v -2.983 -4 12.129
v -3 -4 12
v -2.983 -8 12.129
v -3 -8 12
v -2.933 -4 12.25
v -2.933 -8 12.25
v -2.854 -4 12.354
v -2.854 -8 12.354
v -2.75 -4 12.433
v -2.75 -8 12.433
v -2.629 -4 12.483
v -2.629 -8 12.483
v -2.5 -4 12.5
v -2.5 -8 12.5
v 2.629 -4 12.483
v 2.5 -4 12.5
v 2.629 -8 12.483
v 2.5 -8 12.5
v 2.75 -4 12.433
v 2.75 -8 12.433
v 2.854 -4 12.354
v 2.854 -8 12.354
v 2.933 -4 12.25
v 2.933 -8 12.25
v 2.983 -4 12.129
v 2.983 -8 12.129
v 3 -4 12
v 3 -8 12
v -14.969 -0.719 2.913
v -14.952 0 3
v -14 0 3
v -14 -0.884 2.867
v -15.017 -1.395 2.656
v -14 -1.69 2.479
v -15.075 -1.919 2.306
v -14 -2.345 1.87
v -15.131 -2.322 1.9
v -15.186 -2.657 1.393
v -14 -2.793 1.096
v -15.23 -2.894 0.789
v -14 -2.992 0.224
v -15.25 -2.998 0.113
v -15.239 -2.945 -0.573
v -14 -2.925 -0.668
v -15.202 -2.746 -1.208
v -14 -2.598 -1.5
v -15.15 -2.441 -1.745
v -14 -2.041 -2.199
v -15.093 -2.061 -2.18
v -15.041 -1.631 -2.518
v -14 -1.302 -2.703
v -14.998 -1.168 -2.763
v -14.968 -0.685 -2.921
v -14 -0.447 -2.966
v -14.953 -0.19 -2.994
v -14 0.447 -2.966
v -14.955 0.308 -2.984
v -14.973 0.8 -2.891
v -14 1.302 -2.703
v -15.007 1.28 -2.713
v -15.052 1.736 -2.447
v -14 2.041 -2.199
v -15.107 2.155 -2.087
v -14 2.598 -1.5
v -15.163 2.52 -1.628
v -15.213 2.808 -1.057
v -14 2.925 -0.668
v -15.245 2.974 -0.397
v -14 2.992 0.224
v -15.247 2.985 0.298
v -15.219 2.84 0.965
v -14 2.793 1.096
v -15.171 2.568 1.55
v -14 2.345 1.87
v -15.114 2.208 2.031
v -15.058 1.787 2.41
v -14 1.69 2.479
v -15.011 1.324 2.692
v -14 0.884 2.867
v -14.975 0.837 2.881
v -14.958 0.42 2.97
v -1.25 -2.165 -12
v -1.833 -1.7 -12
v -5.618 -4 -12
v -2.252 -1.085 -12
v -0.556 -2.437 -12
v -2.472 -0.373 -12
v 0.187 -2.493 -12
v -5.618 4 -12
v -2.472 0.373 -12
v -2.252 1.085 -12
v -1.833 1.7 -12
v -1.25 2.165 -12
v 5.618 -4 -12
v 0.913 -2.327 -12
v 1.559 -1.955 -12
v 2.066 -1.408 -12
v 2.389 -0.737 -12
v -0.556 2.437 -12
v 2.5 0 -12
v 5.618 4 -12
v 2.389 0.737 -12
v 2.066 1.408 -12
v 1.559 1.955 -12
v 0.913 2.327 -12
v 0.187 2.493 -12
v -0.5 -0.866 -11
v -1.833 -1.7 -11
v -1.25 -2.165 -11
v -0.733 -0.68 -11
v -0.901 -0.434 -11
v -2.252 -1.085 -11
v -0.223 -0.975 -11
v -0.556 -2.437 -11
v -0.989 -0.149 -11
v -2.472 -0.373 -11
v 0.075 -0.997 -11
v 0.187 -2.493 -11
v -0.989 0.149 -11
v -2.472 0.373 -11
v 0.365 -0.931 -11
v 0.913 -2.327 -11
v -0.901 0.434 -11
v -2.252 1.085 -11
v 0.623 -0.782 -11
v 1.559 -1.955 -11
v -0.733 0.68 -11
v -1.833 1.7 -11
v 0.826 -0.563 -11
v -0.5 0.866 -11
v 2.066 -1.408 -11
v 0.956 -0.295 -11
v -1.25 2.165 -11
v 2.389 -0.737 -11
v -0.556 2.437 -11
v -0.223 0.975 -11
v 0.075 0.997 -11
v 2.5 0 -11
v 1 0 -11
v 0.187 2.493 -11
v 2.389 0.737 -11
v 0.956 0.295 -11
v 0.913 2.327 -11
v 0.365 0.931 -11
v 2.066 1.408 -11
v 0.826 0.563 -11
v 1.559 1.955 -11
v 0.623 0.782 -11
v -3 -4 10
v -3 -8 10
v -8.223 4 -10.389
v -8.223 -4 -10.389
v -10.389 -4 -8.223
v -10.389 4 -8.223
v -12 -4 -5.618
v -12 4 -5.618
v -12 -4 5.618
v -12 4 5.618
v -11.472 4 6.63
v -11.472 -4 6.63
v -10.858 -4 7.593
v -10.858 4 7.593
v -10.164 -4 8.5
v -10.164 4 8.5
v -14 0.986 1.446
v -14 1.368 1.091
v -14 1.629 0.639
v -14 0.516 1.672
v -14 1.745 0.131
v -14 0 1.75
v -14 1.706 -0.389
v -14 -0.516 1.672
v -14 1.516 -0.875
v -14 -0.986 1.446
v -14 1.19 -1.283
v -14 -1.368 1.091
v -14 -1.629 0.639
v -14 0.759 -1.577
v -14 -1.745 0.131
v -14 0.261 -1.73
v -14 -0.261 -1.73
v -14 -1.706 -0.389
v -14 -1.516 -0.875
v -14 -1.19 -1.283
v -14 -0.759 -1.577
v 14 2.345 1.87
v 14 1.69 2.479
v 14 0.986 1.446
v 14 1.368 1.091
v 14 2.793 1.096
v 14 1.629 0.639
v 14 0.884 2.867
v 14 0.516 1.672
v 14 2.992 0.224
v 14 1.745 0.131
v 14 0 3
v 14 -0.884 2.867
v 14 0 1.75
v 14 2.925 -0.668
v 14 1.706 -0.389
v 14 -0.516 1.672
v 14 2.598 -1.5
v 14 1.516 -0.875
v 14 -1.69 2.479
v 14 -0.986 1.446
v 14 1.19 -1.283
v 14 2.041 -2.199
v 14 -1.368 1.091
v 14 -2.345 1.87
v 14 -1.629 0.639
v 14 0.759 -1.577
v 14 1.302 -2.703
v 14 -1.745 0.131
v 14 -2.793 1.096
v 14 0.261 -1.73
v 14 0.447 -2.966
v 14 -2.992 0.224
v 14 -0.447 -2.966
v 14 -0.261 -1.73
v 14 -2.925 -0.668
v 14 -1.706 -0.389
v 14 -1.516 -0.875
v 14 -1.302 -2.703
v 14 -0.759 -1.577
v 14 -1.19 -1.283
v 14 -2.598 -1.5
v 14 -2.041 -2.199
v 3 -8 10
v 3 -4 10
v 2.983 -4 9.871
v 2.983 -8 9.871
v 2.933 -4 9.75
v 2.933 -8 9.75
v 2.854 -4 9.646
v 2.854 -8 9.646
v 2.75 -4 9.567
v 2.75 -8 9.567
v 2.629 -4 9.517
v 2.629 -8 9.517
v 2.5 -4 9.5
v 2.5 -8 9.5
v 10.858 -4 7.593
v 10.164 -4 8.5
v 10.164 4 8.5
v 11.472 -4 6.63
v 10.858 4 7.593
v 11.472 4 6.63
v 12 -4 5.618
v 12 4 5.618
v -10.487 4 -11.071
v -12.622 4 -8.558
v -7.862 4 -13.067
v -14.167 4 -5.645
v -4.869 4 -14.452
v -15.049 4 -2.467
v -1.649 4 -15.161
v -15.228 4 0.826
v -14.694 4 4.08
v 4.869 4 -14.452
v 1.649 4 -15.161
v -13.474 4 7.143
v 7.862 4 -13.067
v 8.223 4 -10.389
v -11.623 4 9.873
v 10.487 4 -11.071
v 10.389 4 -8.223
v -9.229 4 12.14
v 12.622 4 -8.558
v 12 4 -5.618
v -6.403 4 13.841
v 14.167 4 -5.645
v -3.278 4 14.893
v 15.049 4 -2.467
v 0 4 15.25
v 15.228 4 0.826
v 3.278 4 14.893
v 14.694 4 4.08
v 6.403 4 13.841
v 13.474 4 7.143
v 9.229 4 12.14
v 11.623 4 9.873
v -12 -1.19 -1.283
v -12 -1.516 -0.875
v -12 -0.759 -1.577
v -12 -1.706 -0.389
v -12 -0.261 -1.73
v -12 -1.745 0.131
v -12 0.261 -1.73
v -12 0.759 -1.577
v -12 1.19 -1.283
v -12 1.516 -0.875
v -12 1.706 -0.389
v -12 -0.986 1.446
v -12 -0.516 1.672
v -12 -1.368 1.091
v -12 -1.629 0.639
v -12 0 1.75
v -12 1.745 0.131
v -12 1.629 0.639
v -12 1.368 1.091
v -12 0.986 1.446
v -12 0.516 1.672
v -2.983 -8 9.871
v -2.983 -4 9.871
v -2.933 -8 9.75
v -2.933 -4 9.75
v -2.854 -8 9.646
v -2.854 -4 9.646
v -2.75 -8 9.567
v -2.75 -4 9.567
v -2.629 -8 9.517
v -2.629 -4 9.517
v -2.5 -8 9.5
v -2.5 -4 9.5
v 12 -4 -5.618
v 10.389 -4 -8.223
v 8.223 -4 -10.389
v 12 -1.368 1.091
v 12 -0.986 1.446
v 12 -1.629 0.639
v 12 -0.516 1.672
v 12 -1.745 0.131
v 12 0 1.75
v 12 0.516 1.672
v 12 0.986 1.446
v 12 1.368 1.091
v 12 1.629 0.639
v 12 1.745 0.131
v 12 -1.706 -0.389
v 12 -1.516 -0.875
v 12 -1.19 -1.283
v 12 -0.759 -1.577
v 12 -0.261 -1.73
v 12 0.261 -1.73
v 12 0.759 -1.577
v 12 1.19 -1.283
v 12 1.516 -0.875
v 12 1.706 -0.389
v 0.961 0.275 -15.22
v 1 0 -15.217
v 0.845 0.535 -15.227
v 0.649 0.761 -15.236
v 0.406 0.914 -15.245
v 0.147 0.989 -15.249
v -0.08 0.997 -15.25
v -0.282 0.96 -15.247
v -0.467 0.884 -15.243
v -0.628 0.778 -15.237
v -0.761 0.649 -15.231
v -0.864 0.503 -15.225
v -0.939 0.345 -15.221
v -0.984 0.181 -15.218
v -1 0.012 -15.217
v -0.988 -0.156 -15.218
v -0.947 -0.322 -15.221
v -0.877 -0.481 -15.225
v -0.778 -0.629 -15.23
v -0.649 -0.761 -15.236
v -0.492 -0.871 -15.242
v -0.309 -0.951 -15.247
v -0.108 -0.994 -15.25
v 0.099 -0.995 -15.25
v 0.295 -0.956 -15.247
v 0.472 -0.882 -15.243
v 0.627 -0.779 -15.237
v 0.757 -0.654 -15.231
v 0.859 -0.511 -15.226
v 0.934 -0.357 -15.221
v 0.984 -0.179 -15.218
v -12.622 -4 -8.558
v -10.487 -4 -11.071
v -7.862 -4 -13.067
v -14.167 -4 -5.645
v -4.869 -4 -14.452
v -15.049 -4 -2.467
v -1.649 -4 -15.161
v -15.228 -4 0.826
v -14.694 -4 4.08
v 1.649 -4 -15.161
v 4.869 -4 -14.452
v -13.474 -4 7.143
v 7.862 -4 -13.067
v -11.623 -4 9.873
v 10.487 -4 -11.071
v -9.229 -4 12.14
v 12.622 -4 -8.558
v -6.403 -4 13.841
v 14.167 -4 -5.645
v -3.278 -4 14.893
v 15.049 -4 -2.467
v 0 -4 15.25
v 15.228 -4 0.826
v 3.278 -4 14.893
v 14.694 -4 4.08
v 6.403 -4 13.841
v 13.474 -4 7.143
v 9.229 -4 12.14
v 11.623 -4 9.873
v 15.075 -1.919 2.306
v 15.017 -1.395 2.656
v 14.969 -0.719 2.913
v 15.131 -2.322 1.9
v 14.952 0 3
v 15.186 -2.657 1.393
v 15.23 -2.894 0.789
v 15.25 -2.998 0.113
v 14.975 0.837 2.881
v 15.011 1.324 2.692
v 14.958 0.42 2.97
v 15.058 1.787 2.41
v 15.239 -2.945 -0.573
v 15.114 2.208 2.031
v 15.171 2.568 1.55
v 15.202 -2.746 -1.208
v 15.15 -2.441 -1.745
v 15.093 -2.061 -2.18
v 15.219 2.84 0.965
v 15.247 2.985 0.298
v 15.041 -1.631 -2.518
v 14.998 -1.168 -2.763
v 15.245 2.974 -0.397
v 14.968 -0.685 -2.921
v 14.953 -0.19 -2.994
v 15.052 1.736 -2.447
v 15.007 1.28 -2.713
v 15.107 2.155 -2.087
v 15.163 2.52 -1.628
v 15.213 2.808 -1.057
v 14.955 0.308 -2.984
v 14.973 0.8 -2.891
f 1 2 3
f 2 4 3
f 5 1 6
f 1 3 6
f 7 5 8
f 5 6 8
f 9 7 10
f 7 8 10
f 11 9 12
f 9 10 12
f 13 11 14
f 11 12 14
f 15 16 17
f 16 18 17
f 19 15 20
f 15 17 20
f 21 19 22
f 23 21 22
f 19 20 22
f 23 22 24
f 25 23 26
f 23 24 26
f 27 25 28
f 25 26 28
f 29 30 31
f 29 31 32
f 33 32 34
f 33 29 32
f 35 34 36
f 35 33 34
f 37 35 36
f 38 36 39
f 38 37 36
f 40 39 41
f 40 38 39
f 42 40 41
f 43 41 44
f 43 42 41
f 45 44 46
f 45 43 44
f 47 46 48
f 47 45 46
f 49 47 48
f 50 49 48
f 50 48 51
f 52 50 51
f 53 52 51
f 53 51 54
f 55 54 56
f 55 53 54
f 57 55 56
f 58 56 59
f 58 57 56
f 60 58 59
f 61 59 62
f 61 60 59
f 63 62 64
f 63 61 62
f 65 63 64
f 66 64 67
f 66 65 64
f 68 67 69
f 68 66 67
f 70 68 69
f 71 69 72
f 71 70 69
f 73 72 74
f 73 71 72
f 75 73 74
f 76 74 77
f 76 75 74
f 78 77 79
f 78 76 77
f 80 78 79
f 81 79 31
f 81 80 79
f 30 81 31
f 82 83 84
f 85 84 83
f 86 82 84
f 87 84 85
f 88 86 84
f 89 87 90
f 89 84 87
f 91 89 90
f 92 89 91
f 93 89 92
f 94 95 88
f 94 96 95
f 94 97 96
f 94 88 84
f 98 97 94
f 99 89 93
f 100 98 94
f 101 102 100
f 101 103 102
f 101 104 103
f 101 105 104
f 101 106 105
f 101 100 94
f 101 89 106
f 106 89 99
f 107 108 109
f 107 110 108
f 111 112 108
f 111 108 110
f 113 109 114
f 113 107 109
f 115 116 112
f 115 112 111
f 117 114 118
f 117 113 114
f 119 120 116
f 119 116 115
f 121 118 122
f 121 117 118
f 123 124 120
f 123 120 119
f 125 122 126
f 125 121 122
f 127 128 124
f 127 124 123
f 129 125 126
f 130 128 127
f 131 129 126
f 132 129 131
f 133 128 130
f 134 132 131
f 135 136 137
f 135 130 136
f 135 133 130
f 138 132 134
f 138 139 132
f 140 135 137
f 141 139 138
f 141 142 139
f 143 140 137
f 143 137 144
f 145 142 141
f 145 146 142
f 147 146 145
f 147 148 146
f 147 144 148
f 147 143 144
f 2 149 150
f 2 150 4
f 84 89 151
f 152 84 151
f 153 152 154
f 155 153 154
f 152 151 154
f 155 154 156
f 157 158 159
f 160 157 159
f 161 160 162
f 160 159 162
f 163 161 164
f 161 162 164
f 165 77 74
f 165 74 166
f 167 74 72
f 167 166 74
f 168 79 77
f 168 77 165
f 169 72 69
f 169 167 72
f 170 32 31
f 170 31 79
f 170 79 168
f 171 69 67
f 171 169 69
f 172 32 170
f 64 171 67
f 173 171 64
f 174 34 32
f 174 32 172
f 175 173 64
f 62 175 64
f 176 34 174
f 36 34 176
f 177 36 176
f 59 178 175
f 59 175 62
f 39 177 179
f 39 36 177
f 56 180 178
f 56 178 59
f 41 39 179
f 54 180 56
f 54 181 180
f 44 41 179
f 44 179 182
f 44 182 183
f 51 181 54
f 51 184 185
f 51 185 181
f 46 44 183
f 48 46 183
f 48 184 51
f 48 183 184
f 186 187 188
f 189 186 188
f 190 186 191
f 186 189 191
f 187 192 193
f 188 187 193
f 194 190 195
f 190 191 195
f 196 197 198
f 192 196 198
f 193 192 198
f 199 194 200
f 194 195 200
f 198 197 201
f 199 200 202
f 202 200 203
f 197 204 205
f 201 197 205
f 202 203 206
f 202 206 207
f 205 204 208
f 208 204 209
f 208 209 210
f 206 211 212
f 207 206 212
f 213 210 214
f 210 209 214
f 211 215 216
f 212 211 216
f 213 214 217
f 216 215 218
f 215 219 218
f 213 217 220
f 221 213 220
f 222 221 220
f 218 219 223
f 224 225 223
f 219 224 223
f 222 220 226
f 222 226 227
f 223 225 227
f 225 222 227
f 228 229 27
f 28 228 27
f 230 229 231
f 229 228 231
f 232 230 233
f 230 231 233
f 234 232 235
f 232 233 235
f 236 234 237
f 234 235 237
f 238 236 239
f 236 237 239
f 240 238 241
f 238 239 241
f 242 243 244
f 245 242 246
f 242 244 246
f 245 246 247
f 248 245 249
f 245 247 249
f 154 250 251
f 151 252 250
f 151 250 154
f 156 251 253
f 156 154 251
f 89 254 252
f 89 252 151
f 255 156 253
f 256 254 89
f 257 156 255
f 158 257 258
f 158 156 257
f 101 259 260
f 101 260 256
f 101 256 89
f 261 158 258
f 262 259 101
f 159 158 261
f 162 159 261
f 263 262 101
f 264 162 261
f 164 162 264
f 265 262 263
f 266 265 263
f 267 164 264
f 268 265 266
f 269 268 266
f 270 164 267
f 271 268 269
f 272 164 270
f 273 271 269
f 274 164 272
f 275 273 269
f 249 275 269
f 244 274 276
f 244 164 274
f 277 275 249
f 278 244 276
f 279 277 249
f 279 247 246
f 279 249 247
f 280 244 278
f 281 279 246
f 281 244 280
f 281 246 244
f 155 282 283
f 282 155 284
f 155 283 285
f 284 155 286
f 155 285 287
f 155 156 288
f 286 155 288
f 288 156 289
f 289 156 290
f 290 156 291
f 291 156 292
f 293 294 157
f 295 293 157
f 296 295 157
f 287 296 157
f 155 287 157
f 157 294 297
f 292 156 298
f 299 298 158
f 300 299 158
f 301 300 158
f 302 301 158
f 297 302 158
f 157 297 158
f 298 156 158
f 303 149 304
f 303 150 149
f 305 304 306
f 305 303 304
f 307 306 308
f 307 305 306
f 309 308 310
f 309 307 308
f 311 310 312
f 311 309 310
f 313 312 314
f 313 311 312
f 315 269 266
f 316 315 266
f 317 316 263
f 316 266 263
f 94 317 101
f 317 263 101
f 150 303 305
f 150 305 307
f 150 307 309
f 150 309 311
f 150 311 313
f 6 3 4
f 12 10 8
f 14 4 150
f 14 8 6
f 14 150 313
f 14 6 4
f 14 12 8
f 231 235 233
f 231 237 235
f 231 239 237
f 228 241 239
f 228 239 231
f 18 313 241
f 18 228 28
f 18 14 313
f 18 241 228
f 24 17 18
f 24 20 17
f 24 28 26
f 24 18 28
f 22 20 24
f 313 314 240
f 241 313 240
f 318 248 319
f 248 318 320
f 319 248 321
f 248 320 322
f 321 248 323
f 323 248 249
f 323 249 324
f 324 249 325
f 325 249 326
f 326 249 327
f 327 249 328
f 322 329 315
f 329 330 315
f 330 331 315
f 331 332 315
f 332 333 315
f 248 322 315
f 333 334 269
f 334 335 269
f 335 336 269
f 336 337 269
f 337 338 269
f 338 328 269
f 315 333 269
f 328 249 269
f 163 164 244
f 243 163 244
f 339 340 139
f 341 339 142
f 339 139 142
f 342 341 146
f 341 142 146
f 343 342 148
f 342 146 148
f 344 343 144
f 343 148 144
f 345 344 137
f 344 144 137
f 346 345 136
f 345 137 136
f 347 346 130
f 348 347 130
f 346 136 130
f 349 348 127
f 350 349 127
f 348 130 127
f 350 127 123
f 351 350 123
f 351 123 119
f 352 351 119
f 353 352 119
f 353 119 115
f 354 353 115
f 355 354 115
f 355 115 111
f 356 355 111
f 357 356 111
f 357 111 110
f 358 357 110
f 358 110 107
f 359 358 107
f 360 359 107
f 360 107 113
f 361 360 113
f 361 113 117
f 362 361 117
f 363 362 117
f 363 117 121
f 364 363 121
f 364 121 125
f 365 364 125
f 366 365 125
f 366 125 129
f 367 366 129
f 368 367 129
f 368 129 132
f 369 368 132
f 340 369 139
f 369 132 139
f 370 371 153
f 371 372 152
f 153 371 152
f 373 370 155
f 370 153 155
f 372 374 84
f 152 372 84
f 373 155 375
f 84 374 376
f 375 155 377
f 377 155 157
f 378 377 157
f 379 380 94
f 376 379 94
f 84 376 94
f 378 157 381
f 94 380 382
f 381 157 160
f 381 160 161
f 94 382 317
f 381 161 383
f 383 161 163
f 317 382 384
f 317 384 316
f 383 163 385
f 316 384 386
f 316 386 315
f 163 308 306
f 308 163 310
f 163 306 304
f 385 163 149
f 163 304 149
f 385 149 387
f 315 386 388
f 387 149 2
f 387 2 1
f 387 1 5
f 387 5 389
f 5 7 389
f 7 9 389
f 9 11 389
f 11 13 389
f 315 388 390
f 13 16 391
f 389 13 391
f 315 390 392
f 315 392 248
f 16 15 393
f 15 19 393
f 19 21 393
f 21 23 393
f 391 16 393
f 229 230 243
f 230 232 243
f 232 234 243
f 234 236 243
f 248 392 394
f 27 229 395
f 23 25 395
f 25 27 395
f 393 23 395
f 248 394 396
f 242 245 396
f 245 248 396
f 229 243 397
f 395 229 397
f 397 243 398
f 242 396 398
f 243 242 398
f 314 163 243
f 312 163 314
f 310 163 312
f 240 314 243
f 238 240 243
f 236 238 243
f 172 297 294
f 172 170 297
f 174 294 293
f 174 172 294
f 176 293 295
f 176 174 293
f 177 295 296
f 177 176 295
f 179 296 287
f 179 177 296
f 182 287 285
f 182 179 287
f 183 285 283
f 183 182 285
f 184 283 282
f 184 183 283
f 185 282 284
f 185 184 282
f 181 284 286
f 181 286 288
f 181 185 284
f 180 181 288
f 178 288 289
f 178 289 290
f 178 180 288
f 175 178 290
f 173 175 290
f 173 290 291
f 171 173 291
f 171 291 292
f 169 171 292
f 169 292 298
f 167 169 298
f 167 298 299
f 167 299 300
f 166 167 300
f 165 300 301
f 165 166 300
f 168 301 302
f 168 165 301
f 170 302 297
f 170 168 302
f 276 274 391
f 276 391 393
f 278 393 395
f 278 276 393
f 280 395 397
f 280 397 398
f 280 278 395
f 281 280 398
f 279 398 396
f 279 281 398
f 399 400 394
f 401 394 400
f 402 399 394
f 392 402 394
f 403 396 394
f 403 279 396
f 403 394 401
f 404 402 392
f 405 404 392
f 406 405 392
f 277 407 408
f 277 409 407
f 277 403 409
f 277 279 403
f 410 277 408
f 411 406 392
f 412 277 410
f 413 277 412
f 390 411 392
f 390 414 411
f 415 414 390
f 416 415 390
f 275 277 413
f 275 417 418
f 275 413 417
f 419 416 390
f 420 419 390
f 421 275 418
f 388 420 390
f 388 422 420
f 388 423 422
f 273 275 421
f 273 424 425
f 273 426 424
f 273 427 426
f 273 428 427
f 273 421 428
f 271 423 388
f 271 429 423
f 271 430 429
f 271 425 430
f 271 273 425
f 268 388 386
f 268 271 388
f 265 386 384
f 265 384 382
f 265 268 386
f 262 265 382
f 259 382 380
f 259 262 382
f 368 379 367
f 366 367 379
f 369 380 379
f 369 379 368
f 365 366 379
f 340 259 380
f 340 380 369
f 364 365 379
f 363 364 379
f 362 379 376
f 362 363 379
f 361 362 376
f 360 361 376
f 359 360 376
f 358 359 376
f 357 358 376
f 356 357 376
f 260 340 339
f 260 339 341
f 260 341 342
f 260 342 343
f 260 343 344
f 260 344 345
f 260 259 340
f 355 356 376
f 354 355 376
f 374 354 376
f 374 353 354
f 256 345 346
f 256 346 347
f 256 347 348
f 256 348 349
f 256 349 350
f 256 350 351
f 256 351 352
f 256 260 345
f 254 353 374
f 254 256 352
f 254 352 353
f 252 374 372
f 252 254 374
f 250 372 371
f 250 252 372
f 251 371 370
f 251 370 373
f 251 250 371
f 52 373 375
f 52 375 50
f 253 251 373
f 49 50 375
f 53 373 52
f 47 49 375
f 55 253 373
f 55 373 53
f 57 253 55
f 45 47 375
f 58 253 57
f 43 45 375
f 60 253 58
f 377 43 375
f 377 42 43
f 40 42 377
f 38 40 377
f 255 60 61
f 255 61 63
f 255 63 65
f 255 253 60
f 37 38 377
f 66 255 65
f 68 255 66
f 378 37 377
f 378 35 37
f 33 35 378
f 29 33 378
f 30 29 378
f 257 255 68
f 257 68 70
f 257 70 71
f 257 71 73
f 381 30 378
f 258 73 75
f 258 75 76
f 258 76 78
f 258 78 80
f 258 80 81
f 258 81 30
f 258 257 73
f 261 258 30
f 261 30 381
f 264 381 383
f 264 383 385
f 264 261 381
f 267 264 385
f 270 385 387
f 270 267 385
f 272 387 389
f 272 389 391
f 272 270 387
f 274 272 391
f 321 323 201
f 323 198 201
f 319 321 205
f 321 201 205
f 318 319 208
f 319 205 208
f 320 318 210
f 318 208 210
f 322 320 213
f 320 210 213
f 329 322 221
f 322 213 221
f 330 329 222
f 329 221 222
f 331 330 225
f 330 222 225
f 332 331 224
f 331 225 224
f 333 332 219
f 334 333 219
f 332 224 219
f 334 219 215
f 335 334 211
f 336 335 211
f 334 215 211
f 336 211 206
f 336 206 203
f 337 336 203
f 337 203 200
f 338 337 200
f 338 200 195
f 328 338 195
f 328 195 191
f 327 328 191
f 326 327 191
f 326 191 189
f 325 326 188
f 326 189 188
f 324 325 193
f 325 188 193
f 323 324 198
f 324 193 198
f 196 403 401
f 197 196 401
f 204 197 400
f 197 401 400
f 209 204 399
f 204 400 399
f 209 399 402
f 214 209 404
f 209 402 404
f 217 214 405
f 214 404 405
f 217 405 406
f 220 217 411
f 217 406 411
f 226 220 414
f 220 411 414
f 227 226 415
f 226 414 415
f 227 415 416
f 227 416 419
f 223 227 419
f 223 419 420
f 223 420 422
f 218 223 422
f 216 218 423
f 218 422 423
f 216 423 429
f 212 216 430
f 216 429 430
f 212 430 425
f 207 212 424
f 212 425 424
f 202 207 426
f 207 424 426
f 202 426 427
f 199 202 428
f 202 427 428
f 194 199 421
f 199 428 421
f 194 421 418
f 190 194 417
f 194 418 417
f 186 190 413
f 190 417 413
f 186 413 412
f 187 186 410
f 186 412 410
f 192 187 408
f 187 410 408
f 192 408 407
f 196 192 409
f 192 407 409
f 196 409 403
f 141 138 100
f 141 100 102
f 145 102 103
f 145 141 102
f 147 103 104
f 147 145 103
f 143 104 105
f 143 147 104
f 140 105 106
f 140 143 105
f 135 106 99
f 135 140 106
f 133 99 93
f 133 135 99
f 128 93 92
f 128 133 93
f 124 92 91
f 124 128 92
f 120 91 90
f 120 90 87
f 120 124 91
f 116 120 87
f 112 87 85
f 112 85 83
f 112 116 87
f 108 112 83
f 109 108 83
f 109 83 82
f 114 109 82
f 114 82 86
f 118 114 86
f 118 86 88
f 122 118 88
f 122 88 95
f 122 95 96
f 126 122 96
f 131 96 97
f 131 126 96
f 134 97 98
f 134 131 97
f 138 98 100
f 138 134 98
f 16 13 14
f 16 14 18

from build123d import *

# Parameters (mm, degrees)
SKETCH_1_R          = 15.25
EXTRUDE_1_DEPTH     = 4
CUT_EXTRUDE_1_DEPTH = 24.002717231
EXTRUDE_3_REACH     = 33.482
SKETCH_17_W         = 11.236102528
SKETCH_17_H         = 8
SKETCH_16_R         = 1
CUT_EXTRUDE_7_DEPTH = 22.93456194
EXTRUDE_START       = 1
SKETCH_18_R         = 2.5
SKETCH_18_R_2       = 1
EXTRUDE_4_DEPTH     = 1
SKETCH_19_W         = 6
SKETCH_19_H         = 3
EXTRUDE_5_DEPTH     = 4
FILLET_1_R          = 0.5


with BuildPart() as part:
    # 草图1 → 凸台-拉伸1 (new, symmetric)
    with BuildSketch(Plane(origin=(0, 0, 0), x_dir=(1, 0, 0), z_dir=(0, 1, 0))):
        with Locations(Location((0, 0, 0), (0, 0, 270))):
            Circle(SKETCH_1_R)
    extrude(amount=EXTRUDE_1_DEPTH, both=True)

    # 草图2 → 切除-拉伸1 (cut, through all)
    with BuildSketch(Plane(origin=(0, 4, 0), x_dir=(1, 0, 0), z_dir=(0, 1, 0))):
        with BuildLine():
            Line((-12, 5.618051264), (-12, -5.618051264))
            ThreePointArc((-12, -5.618051264), (-11.175427785, -7.118448835), (-10.164275675, -8.5))
            Line((-10.164275675, -8.5), (10.164275675, -8.5))
            ThreePointArc((10.164275675, -8.5), (11.175427785, -7.118448835), (12, -5.618051264))
            Line((12, -5.618051264), (12, 5.618051264))
            ThreePointArc((12, 5.618051264), (0, 13.25), (-12, 5.618051264))
        make_face()
    extrude(amount=-CUT_EXTRUDE_1_DEPTH, mode=Mode.SUBTRACT)

    # 草图3 → 切除-旋转4 (revolve, cut)
    with BuildSketch(Plane(origin=(0, 0, 0), x_dir=(1, 0, 0), z_dir=(0, 1, 0)), mode=Mode.PRIVATE) as cut_revolve_4_sk:
        Polygon((12, 0), (12, 1.75), (14, 1.75), (14, 3), (20, 3), (20, 0), align=None)
    cut_revolve_4 = revolve(cut_revolve_4_sk.sketch.rotate(Axis((0, 0, 0), (1, 0, 0)), 180), axis=Axis((0, 0, 0), (1, 0, 0)), mode=Mode.SUBTRACT)

    # 镜向1: 切除-旋转4 across plane
    add(cut_revolve_4.mirror(Plane(origin=(0, 0, 0), x_dir=(0, 0, 1), z_dir=(1, 0, 0))), mode=Mode.SUBTRACT)

    # 草图17 → 凸台-拉伸3 (add, up to next)
    with BuildSketch(Plane.XY.offset(-12), mode=Mode.PRIVATE) as extrude_3_sk1:
        Rectangle(SKETCH_17_W, SKETCH_17_H)
    extrude_3_tool1 = extrude(extrude_3_sk1.sketch, amount=-EXTRUDE_3_REACH, mode=Mode.PRIVATE) - part.part
    add(extrude_3_tool1.solids().sort_by_distance((0, 0, -12))[0])

    # 草图16 → 切除-拉伸7 (cut, through all)
    with BuildSketch(Plane.XY):
        Circle(SKETCH_16_R)
    extrude(amount=-CUT_EXTRUDE_7_DEPTH, mode=Mode.SUBTRACT)

    # 草图18 → 凸台-拉伸4 (add)
    with BuildSketch(Plane.XY.offset(-12).offset(EXTRUDE_START)):
        Circle(SKETCH_18_R)
        Circle(SKETCH_18_R_2, mode=Mode.SUBTRACT)
    extrude(amount=-EXTRUDE_4_DEPTH)

    # 草图19 → 凸台-拉伸5 (add)
    with BuildSketch(Plane.XZ.offset(4)):
        with Locations((0, 11)):
            Rectangle(SKETCH_19_W, SKETCH_19_H)
    extrude(amount=EXTRUDE_5_DEPTH)

    # 圆角1
    fillet_1_edges = [part.edges().sort_by_distance(p)[0] for p in [
        (3, -6, 9.5),
        (3, -6, 12.5),
        (-3, -6, 12.5),
        (-3, -6, 9.5),
    ]]
    fillet(fillet_1_edges, radius=FILLET_1_R)


solid = part.part
